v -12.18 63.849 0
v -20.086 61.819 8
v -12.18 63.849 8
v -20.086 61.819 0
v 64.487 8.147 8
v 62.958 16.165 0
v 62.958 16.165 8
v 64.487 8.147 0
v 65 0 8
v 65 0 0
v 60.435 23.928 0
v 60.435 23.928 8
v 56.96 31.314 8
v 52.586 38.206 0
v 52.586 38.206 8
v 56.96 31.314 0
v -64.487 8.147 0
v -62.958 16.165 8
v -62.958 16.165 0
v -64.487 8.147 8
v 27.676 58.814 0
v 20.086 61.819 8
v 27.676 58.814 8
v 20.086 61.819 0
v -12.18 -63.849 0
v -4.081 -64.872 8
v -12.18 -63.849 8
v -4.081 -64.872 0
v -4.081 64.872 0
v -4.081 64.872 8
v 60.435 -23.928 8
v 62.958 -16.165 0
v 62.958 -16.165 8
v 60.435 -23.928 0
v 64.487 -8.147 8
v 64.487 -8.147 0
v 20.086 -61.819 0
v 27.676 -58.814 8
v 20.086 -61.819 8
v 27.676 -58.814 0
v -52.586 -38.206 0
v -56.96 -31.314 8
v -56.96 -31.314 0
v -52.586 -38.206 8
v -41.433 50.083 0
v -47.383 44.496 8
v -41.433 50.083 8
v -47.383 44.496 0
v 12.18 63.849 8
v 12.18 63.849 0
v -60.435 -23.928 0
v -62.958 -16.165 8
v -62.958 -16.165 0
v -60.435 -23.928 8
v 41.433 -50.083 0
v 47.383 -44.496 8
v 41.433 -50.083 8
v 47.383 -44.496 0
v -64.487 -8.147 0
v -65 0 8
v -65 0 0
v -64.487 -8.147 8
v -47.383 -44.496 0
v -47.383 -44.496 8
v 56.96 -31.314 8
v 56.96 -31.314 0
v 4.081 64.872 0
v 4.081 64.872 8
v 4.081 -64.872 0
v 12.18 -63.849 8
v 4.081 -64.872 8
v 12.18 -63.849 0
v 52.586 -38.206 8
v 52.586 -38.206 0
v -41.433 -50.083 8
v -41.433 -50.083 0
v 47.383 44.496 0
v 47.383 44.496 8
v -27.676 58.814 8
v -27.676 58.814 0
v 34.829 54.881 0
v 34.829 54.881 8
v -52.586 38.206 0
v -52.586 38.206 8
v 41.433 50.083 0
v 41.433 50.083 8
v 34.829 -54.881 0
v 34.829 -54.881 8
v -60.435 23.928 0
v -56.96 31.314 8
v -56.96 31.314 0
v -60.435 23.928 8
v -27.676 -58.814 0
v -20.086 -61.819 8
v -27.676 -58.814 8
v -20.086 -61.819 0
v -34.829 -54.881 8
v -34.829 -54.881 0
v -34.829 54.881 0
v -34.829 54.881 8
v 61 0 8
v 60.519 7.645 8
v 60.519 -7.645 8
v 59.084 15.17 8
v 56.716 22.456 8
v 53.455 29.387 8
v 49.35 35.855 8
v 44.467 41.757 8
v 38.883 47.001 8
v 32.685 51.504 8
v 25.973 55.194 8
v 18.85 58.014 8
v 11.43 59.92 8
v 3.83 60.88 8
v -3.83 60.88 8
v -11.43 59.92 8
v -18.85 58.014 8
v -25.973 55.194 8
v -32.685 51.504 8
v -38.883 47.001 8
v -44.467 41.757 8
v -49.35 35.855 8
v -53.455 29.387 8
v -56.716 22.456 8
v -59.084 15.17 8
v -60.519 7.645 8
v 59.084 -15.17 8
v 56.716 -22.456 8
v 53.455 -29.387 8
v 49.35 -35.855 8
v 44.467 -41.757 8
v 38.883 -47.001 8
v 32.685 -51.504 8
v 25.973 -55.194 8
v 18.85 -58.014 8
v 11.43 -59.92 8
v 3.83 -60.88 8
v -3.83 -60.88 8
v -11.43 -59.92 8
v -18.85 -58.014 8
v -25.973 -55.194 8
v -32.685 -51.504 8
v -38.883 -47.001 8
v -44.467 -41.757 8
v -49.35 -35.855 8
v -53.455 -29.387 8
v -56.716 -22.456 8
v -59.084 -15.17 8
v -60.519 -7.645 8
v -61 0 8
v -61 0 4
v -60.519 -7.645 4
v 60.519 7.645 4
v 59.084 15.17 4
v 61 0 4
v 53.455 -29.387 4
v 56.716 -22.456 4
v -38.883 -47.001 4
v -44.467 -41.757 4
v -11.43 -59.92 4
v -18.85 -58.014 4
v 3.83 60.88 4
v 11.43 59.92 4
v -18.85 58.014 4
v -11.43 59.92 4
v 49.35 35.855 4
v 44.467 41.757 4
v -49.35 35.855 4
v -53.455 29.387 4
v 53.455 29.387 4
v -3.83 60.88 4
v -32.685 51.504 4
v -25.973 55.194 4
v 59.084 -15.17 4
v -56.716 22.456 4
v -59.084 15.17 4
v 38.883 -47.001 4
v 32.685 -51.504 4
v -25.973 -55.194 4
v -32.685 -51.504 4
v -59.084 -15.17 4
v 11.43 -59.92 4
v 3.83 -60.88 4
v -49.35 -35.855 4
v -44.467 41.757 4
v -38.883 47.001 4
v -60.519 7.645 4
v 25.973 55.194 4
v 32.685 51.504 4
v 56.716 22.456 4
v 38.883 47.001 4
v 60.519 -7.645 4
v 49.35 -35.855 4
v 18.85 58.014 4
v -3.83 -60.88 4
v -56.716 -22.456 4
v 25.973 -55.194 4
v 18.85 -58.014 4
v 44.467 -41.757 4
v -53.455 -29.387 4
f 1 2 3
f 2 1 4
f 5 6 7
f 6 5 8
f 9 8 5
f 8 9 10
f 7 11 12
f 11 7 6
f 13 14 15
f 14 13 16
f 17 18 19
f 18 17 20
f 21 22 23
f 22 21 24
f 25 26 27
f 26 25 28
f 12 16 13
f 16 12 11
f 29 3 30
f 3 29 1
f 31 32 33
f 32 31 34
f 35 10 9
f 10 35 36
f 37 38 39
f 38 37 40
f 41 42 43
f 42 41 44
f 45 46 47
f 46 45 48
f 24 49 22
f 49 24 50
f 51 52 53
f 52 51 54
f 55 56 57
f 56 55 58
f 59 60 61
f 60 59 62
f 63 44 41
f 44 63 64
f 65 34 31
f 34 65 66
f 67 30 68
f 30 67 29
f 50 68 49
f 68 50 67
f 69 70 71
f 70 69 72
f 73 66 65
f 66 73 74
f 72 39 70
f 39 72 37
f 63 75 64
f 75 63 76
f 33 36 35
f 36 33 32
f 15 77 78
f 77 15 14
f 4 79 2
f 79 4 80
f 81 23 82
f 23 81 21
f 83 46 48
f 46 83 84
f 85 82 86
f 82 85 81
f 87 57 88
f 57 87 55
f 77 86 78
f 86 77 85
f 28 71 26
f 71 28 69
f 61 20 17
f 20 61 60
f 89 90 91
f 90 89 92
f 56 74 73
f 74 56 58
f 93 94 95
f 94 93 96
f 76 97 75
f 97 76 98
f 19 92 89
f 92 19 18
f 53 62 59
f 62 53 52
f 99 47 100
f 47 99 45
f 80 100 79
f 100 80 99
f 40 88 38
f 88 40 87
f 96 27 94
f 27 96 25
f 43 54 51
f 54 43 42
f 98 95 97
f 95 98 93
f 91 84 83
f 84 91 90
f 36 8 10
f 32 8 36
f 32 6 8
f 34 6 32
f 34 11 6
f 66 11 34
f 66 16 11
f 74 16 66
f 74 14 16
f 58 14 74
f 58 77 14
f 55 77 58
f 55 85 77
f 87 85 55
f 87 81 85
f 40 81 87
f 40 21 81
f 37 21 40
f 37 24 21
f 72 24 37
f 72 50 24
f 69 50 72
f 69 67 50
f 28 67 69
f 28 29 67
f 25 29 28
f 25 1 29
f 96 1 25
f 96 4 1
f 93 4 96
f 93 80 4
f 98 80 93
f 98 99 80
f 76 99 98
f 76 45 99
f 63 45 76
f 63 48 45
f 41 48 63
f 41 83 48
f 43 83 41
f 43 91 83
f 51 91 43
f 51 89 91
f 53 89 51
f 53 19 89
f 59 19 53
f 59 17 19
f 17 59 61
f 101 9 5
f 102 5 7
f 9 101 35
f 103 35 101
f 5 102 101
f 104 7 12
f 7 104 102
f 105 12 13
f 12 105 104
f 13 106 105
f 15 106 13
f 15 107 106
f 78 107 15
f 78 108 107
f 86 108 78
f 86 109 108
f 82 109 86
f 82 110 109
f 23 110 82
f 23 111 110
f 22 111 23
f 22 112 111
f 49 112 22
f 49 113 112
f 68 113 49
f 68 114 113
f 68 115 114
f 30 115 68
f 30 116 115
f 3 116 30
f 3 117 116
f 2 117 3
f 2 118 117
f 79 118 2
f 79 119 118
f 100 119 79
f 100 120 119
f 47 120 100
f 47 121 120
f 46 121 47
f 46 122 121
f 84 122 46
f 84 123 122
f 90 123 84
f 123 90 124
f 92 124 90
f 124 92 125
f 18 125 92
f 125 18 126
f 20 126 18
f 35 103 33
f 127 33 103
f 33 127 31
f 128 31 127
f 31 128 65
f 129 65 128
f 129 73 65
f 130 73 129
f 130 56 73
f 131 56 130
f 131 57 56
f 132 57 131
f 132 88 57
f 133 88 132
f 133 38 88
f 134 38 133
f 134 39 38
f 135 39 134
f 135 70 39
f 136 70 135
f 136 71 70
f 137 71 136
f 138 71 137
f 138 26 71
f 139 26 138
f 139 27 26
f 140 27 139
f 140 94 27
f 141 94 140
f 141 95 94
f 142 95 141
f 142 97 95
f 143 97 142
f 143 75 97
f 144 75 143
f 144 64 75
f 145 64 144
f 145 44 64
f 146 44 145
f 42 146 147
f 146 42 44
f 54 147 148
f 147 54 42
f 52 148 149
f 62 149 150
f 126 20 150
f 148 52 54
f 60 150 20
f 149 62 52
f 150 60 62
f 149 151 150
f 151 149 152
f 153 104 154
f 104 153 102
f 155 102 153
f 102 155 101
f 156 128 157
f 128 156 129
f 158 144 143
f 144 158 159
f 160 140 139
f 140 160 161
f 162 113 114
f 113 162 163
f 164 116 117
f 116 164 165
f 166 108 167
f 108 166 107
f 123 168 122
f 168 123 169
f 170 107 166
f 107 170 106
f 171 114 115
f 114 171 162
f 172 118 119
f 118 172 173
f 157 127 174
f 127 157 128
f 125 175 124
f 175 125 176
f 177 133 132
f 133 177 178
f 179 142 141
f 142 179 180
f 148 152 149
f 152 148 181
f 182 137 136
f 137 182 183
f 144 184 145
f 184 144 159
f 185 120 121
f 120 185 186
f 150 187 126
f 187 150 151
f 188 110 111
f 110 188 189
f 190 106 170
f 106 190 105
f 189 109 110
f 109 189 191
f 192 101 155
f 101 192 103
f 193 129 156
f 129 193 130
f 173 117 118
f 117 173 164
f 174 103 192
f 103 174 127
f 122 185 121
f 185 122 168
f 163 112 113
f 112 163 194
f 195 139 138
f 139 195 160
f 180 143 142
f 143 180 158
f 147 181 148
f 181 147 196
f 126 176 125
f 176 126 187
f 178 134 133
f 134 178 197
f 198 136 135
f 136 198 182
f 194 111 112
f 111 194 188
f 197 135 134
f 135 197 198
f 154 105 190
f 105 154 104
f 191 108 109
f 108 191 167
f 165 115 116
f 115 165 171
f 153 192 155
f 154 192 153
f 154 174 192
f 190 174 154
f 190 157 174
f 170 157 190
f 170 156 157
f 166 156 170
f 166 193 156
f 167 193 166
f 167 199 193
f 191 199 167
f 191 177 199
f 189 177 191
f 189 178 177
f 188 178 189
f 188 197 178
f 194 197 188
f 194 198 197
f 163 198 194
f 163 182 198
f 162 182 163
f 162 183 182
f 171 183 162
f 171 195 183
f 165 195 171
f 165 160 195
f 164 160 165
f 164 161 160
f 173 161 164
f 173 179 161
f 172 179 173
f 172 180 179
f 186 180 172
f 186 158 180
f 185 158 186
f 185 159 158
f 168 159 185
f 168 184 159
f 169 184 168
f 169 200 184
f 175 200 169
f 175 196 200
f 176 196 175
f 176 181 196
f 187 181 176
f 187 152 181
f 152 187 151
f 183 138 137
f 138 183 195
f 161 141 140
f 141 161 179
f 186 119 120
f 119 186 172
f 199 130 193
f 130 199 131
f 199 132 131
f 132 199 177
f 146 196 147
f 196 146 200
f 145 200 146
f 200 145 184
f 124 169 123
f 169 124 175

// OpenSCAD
// Diameter of drink coaster [mm]
outerDiameter=130;

difference() {
	cylinder(h = 8, r=outerDiameter/2, $fn=50);
	translate([0,0,4])
		cylinder(h = 4, r=(outerDiameter/2)-4, $fn=50);
}
